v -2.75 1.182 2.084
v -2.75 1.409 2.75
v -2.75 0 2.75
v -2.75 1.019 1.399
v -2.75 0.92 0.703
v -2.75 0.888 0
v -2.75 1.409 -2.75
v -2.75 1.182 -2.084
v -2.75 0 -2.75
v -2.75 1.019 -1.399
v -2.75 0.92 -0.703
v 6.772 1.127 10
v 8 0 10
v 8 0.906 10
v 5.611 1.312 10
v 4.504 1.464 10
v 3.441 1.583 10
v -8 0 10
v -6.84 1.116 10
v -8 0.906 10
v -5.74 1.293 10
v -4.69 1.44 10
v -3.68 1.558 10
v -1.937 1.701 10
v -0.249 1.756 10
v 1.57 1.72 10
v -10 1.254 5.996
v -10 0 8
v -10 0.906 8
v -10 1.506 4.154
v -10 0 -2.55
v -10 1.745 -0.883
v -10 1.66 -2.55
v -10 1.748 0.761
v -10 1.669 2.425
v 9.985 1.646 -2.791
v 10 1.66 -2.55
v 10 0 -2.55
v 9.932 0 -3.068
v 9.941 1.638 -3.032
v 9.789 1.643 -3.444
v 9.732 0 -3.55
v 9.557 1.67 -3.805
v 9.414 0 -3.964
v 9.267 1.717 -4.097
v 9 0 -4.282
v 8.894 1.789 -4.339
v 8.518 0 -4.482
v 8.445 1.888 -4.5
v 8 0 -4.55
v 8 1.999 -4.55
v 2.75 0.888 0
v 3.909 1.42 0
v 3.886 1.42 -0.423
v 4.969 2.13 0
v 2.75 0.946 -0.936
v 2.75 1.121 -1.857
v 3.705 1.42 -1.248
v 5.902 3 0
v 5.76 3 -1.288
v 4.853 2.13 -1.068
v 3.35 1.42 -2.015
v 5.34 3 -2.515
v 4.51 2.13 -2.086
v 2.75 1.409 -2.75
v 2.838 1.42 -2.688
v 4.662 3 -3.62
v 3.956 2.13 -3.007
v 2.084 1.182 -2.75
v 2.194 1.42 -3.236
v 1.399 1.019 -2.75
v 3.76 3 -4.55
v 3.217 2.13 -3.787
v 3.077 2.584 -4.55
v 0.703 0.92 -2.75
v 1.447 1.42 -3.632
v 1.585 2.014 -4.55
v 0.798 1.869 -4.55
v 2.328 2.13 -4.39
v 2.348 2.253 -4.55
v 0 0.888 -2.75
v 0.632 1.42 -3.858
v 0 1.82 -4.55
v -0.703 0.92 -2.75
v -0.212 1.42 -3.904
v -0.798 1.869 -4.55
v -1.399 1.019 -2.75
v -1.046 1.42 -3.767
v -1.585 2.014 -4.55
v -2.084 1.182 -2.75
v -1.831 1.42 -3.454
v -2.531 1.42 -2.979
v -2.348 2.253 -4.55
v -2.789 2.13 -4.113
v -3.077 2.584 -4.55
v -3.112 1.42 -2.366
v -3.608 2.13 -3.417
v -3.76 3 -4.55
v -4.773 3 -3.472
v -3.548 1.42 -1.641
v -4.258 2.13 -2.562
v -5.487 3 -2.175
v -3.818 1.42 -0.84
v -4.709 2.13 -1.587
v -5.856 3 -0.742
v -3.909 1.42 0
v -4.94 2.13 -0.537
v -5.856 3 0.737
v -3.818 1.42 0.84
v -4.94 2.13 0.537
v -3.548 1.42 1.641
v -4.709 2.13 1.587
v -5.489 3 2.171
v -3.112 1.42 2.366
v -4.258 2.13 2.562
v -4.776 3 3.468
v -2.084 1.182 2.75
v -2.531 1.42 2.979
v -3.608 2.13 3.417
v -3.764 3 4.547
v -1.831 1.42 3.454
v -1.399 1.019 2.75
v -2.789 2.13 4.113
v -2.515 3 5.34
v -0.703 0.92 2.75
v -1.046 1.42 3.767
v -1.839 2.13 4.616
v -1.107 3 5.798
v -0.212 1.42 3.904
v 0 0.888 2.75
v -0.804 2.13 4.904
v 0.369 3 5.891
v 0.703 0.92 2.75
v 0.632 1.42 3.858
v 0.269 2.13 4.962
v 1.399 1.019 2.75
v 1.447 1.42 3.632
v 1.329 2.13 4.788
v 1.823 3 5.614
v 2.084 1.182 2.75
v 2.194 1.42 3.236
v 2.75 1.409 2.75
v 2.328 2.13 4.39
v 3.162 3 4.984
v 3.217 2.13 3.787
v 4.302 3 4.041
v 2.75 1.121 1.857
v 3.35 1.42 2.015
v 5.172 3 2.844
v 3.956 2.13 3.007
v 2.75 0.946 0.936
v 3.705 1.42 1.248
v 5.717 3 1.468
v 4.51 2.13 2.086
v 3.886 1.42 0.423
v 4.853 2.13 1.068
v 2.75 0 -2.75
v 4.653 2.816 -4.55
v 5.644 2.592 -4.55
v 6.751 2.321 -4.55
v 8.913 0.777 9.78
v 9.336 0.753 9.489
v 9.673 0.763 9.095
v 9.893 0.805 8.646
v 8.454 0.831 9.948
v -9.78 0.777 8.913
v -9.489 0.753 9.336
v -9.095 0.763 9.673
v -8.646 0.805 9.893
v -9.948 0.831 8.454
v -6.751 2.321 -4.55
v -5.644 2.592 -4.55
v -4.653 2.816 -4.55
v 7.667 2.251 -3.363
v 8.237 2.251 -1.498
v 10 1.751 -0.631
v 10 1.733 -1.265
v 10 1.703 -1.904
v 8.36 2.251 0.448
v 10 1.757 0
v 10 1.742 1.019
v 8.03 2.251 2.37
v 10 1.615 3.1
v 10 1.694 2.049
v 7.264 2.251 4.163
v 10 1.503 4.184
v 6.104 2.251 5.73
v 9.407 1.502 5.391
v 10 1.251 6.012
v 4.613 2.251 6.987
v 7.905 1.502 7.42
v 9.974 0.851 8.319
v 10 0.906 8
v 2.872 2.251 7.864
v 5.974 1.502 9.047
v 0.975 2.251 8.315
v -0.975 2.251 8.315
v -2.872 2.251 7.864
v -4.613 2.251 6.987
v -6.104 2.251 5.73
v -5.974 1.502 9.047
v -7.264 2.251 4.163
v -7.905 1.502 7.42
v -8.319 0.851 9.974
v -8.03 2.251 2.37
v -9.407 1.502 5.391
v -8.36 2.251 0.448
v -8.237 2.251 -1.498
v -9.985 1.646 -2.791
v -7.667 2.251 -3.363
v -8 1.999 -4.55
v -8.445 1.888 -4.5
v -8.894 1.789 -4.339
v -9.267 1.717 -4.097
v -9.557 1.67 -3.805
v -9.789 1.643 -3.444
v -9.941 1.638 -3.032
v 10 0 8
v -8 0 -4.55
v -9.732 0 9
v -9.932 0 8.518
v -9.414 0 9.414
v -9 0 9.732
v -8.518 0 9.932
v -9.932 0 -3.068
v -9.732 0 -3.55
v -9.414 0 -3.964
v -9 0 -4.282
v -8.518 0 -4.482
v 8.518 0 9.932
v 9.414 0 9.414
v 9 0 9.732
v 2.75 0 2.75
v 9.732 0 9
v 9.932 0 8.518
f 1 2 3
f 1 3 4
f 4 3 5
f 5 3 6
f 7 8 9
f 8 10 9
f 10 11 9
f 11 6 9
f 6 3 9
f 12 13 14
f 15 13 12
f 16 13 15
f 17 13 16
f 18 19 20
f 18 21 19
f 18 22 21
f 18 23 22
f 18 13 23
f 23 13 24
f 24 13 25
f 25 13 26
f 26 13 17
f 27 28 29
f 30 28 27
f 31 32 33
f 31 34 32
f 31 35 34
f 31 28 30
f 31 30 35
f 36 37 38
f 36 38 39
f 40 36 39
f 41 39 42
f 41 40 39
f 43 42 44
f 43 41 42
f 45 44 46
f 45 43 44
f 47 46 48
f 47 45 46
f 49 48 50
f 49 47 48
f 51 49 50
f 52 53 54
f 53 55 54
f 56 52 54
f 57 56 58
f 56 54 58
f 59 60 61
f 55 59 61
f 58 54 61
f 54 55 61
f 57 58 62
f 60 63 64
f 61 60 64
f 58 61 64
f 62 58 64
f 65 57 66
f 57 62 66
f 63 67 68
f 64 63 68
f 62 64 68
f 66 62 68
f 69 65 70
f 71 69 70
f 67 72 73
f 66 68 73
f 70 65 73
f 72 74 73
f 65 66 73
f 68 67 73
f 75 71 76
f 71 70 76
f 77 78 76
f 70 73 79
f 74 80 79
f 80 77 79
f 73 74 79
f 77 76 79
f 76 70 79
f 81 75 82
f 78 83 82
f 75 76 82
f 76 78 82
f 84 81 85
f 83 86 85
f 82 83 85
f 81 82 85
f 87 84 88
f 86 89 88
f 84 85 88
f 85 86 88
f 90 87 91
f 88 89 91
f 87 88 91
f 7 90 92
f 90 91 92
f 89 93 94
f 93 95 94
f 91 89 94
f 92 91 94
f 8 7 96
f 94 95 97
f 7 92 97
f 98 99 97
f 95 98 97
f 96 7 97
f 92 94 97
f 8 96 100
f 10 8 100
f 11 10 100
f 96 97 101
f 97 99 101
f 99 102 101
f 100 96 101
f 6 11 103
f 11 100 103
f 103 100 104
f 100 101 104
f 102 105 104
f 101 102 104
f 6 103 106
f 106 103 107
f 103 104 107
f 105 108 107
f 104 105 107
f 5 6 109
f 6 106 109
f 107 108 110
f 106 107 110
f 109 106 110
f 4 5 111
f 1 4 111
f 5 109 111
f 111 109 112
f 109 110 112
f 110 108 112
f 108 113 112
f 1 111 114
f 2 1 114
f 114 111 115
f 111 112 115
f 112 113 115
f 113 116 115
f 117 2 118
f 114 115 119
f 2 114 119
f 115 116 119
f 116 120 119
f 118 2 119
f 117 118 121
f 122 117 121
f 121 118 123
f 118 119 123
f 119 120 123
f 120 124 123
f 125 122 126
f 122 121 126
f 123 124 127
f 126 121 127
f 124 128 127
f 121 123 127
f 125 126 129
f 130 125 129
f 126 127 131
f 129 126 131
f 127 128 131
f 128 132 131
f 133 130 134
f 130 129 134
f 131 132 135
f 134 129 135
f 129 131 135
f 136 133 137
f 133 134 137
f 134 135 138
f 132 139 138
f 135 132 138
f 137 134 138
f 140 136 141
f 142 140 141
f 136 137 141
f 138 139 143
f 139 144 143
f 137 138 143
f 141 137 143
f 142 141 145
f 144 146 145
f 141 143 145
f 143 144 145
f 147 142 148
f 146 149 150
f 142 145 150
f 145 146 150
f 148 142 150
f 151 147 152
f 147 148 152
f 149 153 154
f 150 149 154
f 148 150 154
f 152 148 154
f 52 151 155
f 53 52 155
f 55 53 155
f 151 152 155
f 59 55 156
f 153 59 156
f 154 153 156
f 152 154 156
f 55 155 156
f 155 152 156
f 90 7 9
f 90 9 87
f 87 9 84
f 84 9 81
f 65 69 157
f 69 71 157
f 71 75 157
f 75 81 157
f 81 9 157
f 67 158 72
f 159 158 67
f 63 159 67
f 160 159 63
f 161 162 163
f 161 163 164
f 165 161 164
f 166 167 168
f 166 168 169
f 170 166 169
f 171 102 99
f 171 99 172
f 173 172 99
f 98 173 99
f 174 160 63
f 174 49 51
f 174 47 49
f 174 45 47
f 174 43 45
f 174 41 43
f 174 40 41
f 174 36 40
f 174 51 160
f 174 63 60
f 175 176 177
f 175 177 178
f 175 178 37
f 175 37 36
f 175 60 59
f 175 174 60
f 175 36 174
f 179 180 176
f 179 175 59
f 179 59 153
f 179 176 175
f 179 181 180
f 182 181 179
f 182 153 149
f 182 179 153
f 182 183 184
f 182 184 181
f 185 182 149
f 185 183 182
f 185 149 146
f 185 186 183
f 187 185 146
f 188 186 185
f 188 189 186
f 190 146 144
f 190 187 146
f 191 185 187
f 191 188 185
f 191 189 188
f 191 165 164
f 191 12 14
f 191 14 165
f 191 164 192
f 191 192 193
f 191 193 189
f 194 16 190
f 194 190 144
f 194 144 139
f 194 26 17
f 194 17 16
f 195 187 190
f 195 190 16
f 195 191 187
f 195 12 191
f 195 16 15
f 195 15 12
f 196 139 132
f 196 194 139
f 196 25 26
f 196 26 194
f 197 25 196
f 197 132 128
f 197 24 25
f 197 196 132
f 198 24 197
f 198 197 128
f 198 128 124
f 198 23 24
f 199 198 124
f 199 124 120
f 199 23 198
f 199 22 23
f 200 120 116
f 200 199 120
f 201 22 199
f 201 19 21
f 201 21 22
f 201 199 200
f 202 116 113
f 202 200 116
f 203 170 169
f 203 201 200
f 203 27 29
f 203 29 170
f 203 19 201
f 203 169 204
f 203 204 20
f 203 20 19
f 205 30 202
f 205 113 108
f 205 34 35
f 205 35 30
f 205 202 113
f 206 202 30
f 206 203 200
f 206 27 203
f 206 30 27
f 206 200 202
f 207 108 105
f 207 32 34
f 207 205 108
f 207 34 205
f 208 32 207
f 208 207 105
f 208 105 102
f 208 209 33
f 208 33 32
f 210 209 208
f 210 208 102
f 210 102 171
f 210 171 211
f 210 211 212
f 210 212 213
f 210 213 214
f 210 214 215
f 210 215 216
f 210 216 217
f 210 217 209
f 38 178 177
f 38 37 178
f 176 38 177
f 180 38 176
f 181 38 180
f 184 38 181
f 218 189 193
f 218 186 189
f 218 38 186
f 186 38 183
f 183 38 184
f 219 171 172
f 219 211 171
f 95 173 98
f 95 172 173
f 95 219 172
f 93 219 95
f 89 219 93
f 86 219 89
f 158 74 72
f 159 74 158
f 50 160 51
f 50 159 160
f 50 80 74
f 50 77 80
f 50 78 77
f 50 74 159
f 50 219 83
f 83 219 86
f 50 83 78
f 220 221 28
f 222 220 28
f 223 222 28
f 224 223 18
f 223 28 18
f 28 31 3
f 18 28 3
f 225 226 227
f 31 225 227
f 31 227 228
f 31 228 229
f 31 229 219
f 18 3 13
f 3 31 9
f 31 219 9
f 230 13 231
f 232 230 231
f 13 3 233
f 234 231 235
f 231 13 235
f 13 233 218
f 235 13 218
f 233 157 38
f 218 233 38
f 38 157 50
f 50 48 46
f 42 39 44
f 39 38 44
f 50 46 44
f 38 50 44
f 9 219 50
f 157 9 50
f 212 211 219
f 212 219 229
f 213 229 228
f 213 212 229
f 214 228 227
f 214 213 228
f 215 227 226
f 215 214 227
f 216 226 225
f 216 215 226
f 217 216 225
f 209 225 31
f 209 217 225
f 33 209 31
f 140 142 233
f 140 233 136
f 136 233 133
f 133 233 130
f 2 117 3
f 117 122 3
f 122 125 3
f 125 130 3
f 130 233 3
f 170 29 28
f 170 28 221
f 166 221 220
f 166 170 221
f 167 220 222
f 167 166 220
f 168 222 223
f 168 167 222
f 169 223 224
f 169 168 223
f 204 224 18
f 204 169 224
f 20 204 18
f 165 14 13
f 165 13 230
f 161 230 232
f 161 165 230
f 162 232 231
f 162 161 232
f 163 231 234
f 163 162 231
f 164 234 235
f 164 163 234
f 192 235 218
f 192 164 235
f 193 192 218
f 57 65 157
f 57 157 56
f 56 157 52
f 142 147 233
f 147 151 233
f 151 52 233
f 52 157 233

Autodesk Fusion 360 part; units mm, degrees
sketch "top" plane through (0, 0, 0) normal (0, 1, 0) x (1, 0, 0)
  line L0 (2.75, -2.75) -> (-2.75, -2.75)
  line L1 (-2.75, -2.75) -> (-2.75, 2.75)
  line L2 (-2.75, 2.75) -> (2.75, 2.75)
  line L3 (2.75, 2.75) -> (2.75, -2.75)
  line L4 (2.75, -2.75) -> (-2.75, 2.75) construction
  line L5 (-2.75, -2.75) -> (2.75, 2.75) construction
  line L6 (-51.8482, 4.55) -> (53.2802, 4.55)
  line L7 (10, -10) -> (-10, -10)
  line L8 (-10, -10) -> (-10, 10)
  line L9 (-10, 10) -> (10, 10)
  line L10 (10, 10) -> (10, -10)
  line L11 (10, -10) -> (-10, 10) construction
  line L12 (-10, -10) -> (10, 10) construction
  line L13 (2.75, 2.75) -> (2.75, 4.55)
  line L14 (-2.75, 2.75) -> (-2.75, 4.55)
  dimension "d1" = 5.5
  dimension "d2" = 5.5
  dimension "d3" = 1.8
  dimension "d4" = 20
  dimension "d5" = 20
extrude "Extrude1" add sketch "top" along normal blind 3 contours L0 L1 L3 L6 L7 L8 L10 L13 L14 | L2 L6 L13 L14
sketch "hole" plane through (0, 0, 0) normal (0, 0, 1) x (1, 0, 0)
  line L0 (0, 0) -> (0, 32.5783)
  circle A0 centre (0, 8.4) radius 8
  line L1 (0, 0.4) -> (15.5935, 0.4) construction
  line L2 (-10, 0) -> (10, 0) construction
  line L3 (10, 0) -> (10, 3) construction
  line L4 (10, 3) -> (-10, 3) construction
  line L5 (-10, 3) -> (-10, 0) construction
  line L6 (5.9025, 3) -> (10, 3)
  line L7 (5.9025, 3) -> (14.475, 0.4)
  line L8 (10, 3) -> (14.475, 3)
  line L9 (14.475, 3) -> (14.475, 0.4)
  point P0 (0, 0.4)
  point P1 (10, 0.4)
  dimension "d8" = 16
  dimension "d9" = 0.4
revolve "Revolve1" cut sketch "hole" angle 360 about axis through (0, 0, 0) along (0, 1, 0) contours L6 L7 L8 L9 | L0 A0 picked at (2.6374, 8.0063)
fillet "Fillet1" radius 2 4 edges at (10, 0.2505, 10) (-10, 0.2505, 10) (-10, 0.729, -4.55) (10, 0.729, -4.55)
sketch "sticky" plane through (0, 0, 0) normal (0, 1, 0) x (1, 0, 0)
  arc A0 (10, 2.55) -> (8, 4.55) centre (8, 2.55) ccw
  line L0 (10, 2.55) -> (10, -8)
  arc A1 (8, -10) -> (10, -8) centre (8, -8) ccw
  line L1 (8, -10) -> (-8, -10)
  arc A2 (-10, -8) -> (-8, -10) centre (-8, -8) ccw
  line L2 (-10, -8) -> (-10, 2.55)
  arc A3 (-8, 4.55) -> (-10, 2.55) centre (-8, 2.55) ccw
  line L3 (-8, 4.55) -> (8, 4.55)
  line L4 (2.75, 2.75) -> (-2.75, 2.75)
  line L5 (-2.75, 2.75) -> (-2.75, -2.75)
  line L6 (-2.75, -2.75) -> (2.75, -2.75)
  line L7 (2.75, -2.75) -> (2.75, 2.75)
